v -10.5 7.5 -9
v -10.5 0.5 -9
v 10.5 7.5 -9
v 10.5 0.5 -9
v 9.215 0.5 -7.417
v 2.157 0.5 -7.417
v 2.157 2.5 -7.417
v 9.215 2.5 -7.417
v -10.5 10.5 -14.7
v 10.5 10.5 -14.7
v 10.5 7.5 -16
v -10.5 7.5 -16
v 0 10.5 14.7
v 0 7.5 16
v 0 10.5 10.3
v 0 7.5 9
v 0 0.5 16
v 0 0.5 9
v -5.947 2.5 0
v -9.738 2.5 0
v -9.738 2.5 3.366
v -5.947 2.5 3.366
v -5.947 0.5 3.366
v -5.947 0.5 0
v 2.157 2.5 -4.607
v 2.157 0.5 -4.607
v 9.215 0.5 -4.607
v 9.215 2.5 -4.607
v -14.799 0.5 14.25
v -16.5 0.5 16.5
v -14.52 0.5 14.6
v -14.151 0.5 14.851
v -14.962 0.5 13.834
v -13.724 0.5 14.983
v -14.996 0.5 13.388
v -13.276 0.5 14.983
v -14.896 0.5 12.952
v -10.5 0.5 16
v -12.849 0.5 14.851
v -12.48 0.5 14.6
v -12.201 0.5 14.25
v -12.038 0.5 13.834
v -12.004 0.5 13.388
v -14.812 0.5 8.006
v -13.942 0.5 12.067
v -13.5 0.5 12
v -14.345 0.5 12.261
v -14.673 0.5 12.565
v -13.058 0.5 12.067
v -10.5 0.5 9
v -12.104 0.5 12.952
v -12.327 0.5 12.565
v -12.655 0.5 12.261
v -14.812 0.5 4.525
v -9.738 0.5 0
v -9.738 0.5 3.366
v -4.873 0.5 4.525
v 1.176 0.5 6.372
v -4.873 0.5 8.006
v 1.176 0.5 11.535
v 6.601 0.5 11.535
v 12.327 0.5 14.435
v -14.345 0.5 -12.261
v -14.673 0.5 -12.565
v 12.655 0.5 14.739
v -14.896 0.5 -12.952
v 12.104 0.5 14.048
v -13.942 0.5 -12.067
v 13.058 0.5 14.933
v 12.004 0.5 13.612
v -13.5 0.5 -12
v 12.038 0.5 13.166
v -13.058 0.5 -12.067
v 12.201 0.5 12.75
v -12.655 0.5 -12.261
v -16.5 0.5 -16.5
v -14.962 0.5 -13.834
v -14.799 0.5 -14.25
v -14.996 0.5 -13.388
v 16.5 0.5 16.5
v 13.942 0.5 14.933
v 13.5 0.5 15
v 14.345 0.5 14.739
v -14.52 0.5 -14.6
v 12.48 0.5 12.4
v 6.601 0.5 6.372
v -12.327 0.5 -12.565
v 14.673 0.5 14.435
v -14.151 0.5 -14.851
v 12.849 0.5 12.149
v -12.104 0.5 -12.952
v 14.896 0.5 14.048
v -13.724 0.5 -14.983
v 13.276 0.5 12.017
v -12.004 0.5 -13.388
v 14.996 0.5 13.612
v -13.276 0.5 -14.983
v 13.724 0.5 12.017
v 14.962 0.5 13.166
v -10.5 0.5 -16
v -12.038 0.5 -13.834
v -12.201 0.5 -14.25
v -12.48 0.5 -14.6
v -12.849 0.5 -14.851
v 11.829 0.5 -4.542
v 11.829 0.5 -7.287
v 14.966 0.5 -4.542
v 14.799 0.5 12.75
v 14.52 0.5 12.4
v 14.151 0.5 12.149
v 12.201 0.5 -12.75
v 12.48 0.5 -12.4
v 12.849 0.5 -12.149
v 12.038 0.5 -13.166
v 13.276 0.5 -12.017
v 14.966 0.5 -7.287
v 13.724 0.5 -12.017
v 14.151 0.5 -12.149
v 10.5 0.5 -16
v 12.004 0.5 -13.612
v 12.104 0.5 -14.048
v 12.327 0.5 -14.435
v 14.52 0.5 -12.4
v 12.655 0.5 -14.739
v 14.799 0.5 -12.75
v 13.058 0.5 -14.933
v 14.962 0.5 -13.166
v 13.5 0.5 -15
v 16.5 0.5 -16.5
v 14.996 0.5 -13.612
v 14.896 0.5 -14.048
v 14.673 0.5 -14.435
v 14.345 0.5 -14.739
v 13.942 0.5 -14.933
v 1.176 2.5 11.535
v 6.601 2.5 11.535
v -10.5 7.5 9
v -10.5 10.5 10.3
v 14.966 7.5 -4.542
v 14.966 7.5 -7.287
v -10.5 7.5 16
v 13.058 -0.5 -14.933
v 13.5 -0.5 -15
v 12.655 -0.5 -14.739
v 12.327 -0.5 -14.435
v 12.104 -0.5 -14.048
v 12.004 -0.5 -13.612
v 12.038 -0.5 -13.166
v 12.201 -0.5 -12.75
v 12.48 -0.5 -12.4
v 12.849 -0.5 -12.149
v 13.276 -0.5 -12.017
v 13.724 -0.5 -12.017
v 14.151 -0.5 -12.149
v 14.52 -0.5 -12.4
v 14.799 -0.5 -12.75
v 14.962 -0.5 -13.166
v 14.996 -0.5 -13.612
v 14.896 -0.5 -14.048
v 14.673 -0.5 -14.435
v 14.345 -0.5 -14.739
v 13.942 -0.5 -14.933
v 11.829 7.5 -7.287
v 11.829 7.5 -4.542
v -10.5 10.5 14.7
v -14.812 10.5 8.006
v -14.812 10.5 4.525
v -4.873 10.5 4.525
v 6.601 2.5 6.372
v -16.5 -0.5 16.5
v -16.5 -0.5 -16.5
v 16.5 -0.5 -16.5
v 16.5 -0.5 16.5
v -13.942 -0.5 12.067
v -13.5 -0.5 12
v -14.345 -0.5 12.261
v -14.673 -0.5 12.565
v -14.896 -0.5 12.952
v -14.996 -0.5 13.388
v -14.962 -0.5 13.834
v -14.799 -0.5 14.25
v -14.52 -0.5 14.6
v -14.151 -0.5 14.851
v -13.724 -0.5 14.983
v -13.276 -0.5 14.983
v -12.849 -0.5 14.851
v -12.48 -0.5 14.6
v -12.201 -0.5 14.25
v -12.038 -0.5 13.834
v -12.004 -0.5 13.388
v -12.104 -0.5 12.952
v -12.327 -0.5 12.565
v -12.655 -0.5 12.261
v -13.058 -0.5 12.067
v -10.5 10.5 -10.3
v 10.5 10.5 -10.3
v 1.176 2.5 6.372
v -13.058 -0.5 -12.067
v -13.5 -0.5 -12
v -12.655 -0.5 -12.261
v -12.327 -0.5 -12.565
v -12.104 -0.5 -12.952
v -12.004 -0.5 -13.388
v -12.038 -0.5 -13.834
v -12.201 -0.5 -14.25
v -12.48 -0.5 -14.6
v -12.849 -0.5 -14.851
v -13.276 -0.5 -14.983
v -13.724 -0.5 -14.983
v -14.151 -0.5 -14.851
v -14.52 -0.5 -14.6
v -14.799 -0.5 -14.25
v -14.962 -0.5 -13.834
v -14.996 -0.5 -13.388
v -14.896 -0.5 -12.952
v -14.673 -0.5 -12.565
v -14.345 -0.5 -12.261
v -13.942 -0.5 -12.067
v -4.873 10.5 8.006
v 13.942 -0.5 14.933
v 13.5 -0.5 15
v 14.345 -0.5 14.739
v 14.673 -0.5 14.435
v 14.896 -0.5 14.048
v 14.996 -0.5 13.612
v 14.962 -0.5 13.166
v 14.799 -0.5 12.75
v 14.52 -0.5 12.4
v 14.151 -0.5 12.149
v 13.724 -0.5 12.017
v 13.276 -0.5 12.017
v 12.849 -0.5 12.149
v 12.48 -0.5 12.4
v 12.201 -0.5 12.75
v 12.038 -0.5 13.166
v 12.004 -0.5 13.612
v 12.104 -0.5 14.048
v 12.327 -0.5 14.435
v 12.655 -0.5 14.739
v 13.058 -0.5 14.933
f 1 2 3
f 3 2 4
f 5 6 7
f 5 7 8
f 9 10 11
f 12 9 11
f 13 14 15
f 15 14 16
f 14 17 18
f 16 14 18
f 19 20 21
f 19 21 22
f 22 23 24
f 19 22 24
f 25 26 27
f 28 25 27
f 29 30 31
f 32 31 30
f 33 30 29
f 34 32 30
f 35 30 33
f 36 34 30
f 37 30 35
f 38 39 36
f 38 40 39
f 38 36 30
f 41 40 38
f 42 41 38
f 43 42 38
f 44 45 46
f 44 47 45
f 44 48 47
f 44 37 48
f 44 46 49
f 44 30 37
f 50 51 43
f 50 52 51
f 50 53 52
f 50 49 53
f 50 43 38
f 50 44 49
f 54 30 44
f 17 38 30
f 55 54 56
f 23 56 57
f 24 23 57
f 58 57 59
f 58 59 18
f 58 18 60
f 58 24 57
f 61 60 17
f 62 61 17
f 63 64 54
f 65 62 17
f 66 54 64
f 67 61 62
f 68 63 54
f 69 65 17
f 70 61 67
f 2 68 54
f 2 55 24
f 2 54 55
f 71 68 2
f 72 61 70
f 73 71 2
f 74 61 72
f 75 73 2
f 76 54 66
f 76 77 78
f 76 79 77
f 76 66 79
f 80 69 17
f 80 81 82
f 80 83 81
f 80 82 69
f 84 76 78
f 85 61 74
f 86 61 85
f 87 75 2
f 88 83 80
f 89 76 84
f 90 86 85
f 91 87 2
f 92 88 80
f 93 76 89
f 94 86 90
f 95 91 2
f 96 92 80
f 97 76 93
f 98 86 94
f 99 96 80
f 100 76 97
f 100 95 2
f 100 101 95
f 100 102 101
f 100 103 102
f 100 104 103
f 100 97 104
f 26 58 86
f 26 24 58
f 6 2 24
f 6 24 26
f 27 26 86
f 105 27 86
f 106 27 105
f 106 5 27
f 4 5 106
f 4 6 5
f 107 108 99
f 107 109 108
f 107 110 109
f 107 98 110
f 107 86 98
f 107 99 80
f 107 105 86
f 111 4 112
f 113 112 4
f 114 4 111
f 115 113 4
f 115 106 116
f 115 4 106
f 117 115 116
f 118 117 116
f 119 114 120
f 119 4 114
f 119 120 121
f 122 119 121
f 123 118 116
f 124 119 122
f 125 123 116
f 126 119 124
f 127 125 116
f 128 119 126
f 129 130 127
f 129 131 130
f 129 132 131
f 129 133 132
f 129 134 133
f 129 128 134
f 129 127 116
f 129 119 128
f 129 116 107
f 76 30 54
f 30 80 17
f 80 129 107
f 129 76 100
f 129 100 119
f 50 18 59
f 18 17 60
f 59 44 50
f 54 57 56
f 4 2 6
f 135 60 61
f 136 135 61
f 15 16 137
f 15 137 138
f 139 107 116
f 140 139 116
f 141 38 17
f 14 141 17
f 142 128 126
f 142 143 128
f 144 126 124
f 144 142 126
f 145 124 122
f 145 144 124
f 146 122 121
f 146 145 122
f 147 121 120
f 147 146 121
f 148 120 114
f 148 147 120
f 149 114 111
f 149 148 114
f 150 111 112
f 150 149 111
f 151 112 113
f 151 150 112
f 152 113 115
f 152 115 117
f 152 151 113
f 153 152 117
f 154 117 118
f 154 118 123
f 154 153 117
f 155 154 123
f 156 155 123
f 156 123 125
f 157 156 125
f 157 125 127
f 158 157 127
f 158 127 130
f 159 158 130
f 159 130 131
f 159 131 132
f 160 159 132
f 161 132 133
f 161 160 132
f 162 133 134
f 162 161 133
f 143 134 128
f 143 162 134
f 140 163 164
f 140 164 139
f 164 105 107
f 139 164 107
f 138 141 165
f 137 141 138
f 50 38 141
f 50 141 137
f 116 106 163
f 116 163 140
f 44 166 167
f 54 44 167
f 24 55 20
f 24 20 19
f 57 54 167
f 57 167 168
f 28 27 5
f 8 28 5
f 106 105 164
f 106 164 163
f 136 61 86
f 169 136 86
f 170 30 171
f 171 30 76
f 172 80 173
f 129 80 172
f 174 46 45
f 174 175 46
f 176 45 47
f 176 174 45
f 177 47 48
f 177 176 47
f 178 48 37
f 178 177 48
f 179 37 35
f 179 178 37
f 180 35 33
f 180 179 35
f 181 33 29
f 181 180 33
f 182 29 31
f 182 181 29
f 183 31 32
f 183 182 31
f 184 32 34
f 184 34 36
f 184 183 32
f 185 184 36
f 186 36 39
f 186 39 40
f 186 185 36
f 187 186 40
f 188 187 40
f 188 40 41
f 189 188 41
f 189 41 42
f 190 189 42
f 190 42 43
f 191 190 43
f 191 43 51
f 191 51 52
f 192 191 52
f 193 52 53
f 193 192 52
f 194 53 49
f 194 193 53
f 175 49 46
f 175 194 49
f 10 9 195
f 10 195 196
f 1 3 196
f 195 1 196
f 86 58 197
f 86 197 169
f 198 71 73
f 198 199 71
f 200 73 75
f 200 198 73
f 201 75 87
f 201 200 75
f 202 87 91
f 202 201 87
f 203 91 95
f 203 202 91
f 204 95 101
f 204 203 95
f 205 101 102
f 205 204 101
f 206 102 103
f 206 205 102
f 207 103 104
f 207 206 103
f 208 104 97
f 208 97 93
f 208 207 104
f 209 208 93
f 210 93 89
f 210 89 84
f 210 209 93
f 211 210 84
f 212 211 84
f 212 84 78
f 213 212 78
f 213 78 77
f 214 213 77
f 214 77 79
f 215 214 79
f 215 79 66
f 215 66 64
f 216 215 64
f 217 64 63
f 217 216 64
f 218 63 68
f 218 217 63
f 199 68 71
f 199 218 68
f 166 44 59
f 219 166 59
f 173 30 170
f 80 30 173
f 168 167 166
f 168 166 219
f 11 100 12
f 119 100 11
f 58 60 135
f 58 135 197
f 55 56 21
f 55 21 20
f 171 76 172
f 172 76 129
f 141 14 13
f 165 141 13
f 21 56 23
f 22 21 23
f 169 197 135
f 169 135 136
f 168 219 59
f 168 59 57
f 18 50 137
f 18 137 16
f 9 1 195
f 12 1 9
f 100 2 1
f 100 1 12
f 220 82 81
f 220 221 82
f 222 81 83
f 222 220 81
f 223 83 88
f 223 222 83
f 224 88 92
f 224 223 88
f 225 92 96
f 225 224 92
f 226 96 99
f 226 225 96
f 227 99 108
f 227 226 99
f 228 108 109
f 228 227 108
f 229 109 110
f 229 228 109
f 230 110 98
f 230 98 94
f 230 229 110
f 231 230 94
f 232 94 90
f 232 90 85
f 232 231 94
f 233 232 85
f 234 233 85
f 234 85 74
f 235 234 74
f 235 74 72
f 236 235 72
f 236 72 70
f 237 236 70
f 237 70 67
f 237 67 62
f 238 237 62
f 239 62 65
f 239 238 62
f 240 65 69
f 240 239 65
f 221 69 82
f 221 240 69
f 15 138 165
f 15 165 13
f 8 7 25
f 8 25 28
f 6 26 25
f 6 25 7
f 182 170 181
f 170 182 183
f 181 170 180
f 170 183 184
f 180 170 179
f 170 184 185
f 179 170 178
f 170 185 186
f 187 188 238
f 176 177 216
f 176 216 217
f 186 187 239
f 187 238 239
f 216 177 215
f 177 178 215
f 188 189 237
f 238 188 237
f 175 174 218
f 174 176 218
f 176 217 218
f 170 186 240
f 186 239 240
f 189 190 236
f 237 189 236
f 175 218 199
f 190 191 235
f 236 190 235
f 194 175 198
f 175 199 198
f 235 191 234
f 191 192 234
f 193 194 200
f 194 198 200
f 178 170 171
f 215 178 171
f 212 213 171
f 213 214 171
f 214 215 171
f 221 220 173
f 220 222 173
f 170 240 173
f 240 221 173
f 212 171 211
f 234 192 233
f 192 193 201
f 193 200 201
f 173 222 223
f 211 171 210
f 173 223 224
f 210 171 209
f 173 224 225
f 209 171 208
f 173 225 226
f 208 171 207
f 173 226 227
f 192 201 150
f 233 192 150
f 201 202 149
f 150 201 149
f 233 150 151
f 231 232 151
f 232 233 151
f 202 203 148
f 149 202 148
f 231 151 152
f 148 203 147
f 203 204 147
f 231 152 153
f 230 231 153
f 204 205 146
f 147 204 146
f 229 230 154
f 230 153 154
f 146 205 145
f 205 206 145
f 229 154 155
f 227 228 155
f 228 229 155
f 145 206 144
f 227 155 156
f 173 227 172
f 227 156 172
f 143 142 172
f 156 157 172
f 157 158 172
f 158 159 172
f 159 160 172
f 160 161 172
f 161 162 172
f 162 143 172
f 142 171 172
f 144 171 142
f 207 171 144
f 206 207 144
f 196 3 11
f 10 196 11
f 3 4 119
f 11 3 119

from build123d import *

# Parameters (mm, degrees)
SKETCH1_W           = 33
SKETCH1_H           = 33
SKETCH1_R           = 1.5
BOSS_EXTRUDE1_DEPTH = 0.5
SKETCH2_W           = 21
SKETCH2_H           = 7
SKETCH2_W_2         = 10.5
SKETCH2_W_3         = 9.939031212
SKETCH2_H_2         = 3.481183521
BOSS_EXTRUDE2_DEPTH = 10
SKETCH3_W           = 5.42424951
SKETCH3_H           = 5.162839894
SKETCH3_W_2         = 7.058059603
SKETCH3_H_2         = 2.81015336
SKETCH3_W_3         = 3.790439417
SKETCH3_H_3         = 3.365648792
BOSS_EXTRUDE3_DEPTH = 2
SKETCH4_W           = 3.136915379
SKETCH4_H           = 2.744800957
BOSS_EXTRUDE4_DEPTH = 7
CUT_EXTRUDE1_DEPTH  = 24


with BuildPart() as part:
    # Sketch1 → Boss-Extrude1 (new, symmetric)
    with BuildSketch(Plane(origin=(0, 0, 0), x_dir=(1, 0, 0), z_dir=(0, 1, 0))):
        Rectangle(SKETCH1_W, SKETCH1_H)
        with Locations(Location((-13.5, 13.5, 0), (0, 0, 270))):
            Circle(SKETCH1_R, mode=Mode.SUBTRACT)
        with Locations(Location((-13.5, -13.5, 0), (0, 0, 90))):
            Circle(SKETCH1_R, mode=Mode.SUBTRACT)
        with Locations(Location((13.5, -13.5, 0), (0, 0, 270))):
            Circle(SKETCH1_R, mode=Mode.SUBTRACT)
        with Locations(Location((13.5, 13.5, 0), (0, 0, 90))):
            Circle(SKETCH1_R, mode=Mode.SUBTRACT)
    extrude(amount=BOSS_EXTRUDE1_DEPTH, both=True)

    # Sketch2 → Boss-Extrude2 (add)
    with BuildSketch(Plane(origin=(0, 0.5, 0), x_dir=(1, 0, 0), z_dir=(0, 1, 0))):
        with Locations((0, 12.5)):
            Rectangle(SKETCH2_W, SKETCH2_H)
        with Locations((-5.25, -12.5)):
            Rectangle(SKETCH2_W_2, SKETCH2_H)
        with Locations((-9.842504173, -6.265483719)):
            Rectangle(SKETCH2_W_3, SKETCH2_H_2)
    extrude(amount=BOSS_EXTRUDE2_DEPTH)

    # Sketch3 → Boss-Extrude3 (add)
    with BuildSketch(Plane(origin=(0, 0.5, 0), x_dir=(1, 0, 0), z_dir=(0, 1, 0))):
        with Locations((3.888468022, -8.953279311)):
            Rectangle(SKETCH3_W, SKETCH3_H)
        with Locations((5.685659125, 6.012421143)):
            Rectangle(SKETCH3_W_2, SKETCH3_H_2)
        with Locations((-7.842288448, -1.682824396)):
            Rectangle(SKETCH3_W_3, SKETCH3_H_3)
    extrude(amount=BOSS_EXTRUDE3_DEPTH)

    # Sketch4 → Boss-Extrude4 (add)
    with BuildSketch(Plane(origin=(0, 0.5, 0), x_dir=(1, 0, 0), z_dir=(0, 1, 0))):
        with Locations((13.397242764, 5.914392538)):
            Rectangle(SKETCH4_W, SKETCH4_H)
    extrude(amount=BOSS_EXTRUDE4_DEPTH)

    # Sketch5 → Cut-Extrude1 (cut)
    with BuildSketch(Plane(origin=(10.5, 0, 0), x_dir=(0, 0, -1), z_dir=(1, 0, 0))):
        Polygon((-16, 10.5), (-16, 7.5), (-14.7, 10.5), align=None)
        Polygon((-10.3, 10.5), (-9, 10.5), (-9, 7.5), align=None)
        Polygon((9, 7.5), (10.3, 10.5), (9, 10.5), align=None)
        Polygon((16, 10.5), (14.7, 10.5), (16, 7.5), align=None)
    extrude(amount=-CUT_EXTRUDE1_DEPTH, mode=Mode.SUBTRACT)


solid = part.part
